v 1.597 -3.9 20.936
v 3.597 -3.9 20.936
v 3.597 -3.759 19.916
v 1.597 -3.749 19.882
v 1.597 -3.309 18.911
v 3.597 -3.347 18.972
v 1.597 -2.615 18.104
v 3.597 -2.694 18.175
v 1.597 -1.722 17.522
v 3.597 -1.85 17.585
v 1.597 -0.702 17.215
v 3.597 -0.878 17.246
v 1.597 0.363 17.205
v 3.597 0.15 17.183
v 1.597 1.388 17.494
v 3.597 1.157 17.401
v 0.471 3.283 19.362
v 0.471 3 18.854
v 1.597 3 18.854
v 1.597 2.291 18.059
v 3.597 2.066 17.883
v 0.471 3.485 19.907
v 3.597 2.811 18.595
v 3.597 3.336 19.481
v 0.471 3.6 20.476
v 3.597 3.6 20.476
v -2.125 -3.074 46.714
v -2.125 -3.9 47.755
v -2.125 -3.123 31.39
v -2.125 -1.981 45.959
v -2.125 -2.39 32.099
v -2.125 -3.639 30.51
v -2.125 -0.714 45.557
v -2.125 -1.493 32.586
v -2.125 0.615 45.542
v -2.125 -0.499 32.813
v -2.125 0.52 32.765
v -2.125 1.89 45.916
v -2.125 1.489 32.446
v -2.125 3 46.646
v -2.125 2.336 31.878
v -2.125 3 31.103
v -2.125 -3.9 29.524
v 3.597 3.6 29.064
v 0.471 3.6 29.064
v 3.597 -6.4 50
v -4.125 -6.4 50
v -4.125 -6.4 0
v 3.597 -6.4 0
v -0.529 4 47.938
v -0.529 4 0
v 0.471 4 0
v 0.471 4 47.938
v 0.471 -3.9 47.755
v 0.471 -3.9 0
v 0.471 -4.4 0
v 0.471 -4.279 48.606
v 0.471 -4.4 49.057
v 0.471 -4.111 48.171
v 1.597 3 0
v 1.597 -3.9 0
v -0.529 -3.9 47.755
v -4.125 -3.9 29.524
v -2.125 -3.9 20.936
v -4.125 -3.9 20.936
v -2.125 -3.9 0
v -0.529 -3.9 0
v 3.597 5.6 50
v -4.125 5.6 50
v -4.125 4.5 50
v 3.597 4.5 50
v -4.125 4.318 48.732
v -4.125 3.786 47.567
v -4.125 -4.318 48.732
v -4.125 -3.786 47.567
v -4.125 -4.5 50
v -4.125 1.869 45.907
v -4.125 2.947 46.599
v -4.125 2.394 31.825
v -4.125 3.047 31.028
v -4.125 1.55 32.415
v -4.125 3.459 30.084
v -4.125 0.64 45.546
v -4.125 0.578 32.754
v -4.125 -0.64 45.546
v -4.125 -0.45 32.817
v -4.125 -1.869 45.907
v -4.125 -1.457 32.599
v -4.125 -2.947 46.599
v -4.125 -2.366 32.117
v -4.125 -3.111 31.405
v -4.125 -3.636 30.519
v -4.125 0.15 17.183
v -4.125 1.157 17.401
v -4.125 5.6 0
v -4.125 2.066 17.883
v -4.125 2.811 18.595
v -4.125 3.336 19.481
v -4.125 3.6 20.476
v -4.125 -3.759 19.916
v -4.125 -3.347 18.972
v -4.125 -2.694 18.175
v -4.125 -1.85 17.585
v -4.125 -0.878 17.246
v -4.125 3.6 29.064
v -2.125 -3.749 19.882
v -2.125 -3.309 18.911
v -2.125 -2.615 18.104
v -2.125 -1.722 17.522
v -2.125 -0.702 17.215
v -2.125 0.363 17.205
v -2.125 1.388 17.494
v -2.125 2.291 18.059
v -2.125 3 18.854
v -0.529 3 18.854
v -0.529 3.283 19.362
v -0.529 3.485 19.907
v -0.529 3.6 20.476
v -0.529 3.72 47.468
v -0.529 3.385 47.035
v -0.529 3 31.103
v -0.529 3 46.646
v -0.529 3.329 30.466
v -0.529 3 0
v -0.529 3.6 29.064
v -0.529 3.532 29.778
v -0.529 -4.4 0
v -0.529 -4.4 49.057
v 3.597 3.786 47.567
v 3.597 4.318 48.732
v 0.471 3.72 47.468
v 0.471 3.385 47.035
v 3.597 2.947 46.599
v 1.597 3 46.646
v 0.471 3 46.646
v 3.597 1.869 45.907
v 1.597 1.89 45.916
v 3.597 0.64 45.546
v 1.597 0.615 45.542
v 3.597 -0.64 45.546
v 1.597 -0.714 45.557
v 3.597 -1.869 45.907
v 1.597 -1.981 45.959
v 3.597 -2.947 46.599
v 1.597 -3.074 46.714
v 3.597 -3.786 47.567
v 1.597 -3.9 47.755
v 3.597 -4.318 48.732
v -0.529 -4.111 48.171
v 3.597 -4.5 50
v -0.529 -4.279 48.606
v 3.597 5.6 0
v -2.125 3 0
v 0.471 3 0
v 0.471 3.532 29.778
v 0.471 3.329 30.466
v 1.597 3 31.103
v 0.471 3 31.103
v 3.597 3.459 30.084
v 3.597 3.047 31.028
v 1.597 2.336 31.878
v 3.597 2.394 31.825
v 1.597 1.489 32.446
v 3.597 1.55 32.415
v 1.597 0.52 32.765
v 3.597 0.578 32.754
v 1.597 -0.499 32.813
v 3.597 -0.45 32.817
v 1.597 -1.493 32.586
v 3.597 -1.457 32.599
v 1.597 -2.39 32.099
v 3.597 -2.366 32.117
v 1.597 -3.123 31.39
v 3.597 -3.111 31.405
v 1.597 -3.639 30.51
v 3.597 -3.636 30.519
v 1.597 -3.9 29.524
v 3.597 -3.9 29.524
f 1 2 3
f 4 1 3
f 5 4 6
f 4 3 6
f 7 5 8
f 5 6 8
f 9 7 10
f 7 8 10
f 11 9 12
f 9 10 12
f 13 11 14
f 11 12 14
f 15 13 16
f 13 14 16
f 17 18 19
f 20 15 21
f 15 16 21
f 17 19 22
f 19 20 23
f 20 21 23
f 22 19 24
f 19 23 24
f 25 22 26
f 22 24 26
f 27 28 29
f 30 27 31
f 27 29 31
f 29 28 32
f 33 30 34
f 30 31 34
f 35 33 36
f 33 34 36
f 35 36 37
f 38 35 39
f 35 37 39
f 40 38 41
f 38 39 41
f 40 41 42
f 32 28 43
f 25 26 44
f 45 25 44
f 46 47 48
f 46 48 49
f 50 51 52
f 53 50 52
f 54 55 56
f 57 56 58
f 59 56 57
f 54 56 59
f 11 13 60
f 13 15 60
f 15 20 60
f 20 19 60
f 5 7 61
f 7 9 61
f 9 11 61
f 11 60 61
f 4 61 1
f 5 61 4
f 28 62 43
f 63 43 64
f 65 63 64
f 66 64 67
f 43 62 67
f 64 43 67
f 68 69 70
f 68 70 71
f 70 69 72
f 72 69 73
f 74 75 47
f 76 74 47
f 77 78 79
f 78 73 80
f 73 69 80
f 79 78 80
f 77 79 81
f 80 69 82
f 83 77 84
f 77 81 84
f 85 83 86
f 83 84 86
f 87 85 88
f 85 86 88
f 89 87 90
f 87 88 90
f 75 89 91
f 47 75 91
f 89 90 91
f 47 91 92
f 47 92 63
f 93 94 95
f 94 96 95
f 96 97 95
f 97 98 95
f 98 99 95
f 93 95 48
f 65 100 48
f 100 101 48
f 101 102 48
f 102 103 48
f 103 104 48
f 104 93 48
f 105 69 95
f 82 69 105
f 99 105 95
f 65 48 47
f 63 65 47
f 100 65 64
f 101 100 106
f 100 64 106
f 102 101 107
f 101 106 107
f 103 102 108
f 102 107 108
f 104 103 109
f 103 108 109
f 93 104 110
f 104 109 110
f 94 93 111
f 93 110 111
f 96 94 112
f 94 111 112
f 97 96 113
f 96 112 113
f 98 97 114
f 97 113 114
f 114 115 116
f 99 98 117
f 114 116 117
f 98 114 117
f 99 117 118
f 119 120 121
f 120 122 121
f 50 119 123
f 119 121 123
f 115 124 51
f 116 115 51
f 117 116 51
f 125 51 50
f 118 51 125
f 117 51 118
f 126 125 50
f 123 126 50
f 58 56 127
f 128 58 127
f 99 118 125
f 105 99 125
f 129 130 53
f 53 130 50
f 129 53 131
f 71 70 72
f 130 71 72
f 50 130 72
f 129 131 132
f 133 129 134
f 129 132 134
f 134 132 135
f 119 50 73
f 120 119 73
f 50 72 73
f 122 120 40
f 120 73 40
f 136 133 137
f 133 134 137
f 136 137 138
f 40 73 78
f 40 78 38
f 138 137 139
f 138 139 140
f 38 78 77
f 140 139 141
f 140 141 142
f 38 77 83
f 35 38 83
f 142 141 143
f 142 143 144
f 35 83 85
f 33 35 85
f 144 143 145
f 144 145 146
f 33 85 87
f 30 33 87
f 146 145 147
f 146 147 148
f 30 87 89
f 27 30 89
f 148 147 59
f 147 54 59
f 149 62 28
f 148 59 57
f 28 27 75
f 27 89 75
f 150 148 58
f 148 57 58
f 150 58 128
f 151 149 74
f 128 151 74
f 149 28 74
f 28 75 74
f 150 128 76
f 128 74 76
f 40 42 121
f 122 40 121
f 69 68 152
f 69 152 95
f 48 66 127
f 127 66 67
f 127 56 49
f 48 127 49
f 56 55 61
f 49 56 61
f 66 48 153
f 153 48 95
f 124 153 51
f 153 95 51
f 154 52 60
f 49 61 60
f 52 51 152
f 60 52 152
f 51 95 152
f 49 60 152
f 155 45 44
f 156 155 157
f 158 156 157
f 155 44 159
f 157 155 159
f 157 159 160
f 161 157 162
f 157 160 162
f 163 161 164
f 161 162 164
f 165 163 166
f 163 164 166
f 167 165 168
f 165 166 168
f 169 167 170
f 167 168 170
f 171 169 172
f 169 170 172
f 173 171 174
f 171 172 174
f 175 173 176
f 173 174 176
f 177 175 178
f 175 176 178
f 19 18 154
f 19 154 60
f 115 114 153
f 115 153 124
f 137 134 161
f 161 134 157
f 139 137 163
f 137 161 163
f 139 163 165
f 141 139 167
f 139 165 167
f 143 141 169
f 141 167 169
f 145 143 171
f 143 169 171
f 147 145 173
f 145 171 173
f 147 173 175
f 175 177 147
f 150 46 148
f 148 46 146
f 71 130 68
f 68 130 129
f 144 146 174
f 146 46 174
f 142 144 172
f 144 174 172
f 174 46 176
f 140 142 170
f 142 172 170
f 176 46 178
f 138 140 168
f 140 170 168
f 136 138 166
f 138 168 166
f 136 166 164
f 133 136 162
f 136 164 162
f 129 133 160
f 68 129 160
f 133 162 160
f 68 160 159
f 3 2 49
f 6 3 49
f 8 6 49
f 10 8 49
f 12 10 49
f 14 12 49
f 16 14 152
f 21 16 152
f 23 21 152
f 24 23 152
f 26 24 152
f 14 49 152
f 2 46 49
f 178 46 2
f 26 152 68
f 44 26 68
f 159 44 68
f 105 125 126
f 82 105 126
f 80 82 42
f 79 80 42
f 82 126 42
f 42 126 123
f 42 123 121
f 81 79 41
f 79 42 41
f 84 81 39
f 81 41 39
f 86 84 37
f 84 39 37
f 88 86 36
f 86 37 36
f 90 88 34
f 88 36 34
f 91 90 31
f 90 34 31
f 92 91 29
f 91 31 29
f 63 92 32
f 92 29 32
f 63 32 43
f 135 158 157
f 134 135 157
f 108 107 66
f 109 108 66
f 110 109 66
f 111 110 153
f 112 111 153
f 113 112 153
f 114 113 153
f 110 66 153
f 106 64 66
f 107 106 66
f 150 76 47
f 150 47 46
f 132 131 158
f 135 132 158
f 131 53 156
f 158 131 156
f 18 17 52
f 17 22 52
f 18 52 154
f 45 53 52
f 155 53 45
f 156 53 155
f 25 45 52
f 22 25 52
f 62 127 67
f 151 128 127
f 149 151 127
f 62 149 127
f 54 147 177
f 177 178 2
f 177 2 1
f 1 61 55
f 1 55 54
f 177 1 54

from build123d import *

# Parameters (mm, degrees)
F1_DEPTH = 50
F3_DEPTH = 25
F4_R     = 4.5
F5_DEPTH = 25


with BuildPart() as f1:
    # F0 (on Top) → F1 (new body)
    with BuildSketch(Plane.XY):
        Polygon((1.597207, 5.6), (-2.124833, 5.6), (-4.124833, 5.6), (-4.124833, -6.4), (-2.124833, -6.4), (1.597207, -6.4), (3.597207, -6.4), (3.597207, 5.6), align=None)
        Polygon((-0.528539, 3), (-0.528539, 4), (0.471461, 4), (0.471461, 3), (1.597207, 3), (1.597207, -3.9), (0.471461, -3.9), (0.471461, -4.4), (-0.528539, -4.4), (-0.528539, -3.9), (-2.124833, -3.9), (-2.124833, 3), align=None, mode=Mode.SUBTRACT)
    extrude(amount=F1_DEPTH)

    # F2 (on face) → F3 (cut)
    with BuildSketch(Plane.YZ.offset(3.597207)):
        with BuildLine():
            Line((-3.9, 29.523588), (-3.9, 20.935996))
            ThreePointArc((-3.9, 20.935996), (-0.366142, 17.178962), (3.6, 20.476412))
            Line((3.6, 20.476412), (3.6, 29.064004))
            ThreePointArc((3.6, 29.064004), (0.066142, 32.821038), (-3.9, 29.523588))
        make_face()
    extrude(amount=-F3_DEPTH, mode=Mode.SUBTRACT)

    # F4 (on face) → F5 (cut)
    with BuildSketch(Plane(origin=(-4.124833, 0, 0), x_dir=(0, -1, 0), z_dir=(-1, 0, 0))):
        with Locations((0, 50)):
            Circle(F4_R)
    extrude(amount=-F5_DEPTH, mode=Mode.SUBTRACT)


solid = f1.part
